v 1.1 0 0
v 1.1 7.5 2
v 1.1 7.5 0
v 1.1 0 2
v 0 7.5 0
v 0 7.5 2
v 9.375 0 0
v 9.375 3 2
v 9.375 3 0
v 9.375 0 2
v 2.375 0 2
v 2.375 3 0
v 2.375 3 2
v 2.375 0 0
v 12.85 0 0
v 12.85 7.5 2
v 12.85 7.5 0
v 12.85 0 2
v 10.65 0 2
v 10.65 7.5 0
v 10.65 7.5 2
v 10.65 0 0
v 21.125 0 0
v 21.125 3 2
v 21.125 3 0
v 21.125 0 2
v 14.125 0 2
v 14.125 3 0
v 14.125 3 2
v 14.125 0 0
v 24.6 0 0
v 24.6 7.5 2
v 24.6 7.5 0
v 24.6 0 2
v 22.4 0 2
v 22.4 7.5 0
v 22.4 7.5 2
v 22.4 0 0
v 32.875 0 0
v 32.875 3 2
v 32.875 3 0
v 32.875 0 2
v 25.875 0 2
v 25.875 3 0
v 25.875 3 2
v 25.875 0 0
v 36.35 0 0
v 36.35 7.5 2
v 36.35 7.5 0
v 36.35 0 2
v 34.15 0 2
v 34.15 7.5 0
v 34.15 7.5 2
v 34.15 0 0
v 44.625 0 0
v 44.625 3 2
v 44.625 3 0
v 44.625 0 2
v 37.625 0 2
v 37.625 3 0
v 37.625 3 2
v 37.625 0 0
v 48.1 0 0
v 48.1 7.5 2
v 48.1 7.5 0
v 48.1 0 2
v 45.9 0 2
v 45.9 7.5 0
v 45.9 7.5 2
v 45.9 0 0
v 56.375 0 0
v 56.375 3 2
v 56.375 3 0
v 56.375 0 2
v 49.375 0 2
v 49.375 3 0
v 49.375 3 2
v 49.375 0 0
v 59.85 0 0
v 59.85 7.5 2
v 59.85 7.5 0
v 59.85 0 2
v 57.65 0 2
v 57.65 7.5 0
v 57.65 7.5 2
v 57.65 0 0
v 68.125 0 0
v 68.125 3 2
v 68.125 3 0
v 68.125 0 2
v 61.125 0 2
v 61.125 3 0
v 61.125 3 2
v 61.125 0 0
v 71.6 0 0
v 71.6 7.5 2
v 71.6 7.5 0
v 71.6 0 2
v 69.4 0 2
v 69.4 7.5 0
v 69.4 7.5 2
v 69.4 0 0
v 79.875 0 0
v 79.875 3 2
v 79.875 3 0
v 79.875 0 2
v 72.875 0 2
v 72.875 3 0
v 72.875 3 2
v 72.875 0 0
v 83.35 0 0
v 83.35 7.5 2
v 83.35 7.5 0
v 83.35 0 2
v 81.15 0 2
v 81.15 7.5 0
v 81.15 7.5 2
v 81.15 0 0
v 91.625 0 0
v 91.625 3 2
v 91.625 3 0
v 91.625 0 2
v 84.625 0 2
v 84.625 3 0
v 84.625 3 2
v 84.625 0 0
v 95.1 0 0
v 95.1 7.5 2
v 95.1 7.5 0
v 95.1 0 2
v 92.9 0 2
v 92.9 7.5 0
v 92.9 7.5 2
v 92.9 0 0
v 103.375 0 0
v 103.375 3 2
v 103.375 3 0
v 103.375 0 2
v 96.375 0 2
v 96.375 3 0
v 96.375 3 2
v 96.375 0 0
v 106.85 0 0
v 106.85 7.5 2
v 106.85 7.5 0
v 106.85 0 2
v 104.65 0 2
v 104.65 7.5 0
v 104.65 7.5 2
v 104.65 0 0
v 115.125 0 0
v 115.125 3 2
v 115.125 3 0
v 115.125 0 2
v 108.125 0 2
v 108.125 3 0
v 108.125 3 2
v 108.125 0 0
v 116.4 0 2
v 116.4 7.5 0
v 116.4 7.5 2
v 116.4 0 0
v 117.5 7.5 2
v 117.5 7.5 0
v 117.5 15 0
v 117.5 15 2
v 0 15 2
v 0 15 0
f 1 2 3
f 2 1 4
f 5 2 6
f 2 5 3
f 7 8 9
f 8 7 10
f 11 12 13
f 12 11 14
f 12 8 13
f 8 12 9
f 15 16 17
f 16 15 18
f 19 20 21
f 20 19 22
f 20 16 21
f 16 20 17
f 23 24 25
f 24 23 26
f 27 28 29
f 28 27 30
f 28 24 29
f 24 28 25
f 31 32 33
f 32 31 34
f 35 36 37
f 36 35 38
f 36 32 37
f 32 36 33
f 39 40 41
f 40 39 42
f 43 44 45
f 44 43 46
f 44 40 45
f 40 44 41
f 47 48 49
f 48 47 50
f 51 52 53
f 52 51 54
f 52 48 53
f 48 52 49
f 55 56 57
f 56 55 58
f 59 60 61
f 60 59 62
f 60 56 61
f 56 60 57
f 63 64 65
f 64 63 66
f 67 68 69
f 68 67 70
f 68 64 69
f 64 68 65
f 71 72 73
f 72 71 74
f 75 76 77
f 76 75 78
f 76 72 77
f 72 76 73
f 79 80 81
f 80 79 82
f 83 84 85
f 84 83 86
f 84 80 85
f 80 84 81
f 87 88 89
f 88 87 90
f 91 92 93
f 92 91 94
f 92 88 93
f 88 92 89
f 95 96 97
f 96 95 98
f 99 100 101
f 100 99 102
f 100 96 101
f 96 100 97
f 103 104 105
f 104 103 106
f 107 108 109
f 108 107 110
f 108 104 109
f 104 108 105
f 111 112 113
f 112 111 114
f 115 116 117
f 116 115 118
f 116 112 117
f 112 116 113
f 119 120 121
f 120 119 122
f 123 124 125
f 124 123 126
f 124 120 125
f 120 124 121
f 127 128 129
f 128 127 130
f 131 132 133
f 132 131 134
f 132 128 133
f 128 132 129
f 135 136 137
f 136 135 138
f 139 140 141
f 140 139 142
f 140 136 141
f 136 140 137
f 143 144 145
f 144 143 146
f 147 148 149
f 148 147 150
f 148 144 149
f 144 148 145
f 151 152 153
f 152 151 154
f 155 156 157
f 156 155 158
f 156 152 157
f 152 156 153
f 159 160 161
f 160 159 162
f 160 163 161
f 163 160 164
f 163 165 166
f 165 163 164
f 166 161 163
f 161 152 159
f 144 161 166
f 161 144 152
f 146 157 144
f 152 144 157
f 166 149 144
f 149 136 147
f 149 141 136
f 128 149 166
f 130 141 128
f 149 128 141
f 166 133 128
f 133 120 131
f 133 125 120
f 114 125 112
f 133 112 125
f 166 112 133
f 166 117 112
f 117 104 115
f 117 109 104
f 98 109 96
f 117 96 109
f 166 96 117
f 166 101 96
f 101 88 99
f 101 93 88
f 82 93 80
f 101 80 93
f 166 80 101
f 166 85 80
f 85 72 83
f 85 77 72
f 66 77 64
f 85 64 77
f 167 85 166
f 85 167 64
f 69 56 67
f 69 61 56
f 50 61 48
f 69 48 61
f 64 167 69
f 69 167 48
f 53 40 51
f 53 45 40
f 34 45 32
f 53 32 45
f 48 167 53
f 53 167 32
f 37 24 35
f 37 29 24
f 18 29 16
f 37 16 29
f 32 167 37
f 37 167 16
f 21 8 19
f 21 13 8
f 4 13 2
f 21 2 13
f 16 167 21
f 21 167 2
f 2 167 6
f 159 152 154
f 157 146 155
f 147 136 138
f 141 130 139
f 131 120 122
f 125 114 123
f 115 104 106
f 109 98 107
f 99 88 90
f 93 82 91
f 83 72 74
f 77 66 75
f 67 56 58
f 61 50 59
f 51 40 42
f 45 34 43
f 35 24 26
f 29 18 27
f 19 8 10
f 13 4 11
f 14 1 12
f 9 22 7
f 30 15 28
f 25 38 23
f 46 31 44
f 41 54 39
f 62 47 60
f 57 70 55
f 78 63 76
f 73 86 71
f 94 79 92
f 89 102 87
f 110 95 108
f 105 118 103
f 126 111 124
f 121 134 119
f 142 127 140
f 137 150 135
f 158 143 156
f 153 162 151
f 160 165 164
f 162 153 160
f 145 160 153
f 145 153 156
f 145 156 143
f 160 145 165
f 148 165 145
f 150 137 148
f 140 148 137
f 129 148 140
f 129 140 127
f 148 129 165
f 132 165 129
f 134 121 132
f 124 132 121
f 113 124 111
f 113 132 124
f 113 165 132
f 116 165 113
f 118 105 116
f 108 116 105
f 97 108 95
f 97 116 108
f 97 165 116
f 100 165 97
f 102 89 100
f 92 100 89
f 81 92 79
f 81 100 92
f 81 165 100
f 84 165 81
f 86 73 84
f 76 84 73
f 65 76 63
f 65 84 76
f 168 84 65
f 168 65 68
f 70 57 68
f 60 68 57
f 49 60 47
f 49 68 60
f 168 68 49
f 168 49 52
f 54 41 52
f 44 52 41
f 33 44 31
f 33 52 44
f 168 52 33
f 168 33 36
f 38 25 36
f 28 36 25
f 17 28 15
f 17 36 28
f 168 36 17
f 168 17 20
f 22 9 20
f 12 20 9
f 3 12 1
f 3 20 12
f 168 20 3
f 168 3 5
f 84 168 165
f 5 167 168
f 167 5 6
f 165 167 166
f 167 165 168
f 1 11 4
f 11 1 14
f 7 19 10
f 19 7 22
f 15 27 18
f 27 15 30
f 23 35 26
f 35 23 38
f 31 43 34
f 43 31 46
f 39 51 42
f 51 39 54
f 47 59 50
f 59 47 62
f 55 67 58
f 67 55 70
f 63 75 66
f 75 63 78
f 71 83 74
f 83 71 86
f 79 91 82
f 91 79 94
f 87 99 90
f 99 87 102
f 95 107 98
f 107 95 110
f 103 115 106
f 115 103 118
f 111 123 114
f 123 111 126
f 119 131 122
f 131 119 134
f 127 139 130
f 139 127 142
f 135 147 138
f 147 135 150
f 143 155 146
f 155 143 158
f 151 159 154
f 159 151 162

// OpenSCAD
CUT = 1000;

KeyWidth = 6;
KeySpacing = 117.5 / 10; //KeyWidth + KeyGapWidth;
KeyGapWidth = KeySpacing - KeyWidth;

KeyTravel = 2;
MinSensorDistance = 1.5;
MinKeyHeight = 1;
MaxKeyHeight = MinKeyHeight + KeyTravel;
SensorHeight = 4.5;
SensorWidth = 4.5;
SensorLength = 7;
SensorOffset = 4.5;
SensorGap = 5;

SlotWidth = 2.2;
SlotHeight = 7.5;
NSlots = 33/3;

PcbHeight = 20;
PcbStopThickness = 2;
HookHeight = MaxKeyHeight + MinSensorDistance + SensorHeight;
HookLength = 21;
HookDrop = 20;
HookArm = 2;
HookThickness = SlotWidth-0.1;
HookRetainerHeight = 1;
HookRetainerThickness = 1;

RailHeight = 15;
RailLength = KeySpacing*(NSlots-1);
echo(RailLength);
RailThickness = 2;
RailArea = RailThickness * 2 + 3 * HookRetainerThickness;

TotalLength = RailArea + HookLength;

echo(TotalLength);
assert(TotalLength < 33);

// from hook print aligned perspective

ShelfWidth = 10;
ShelfLength = 10;
SelfThickness = 10;
ShelfRetainerHeight = 5;

module rail()
{
    difference()
    {
        cube([RailLength, RailHeight, RailThickness]);
        // make iterative
        for (i = [0:1:NSlots]) {
            translate([-SlotWidth/2+i*KeySpacing, -1, -1])
                cube([SlotWidth, SlotHeight+1, CUT]);
            translate([KeyGapWidth/2-0.5+i*KeySpacing, -1, -1])
                cube([KeyWidth+1, MaxKeyHeight+1, CUT]);
        }
    }
}

module hook()
{
    difference()
    {
        union()
        {
            // bottom bar
            cube([HookLength, HookArm, HookThickness]);
            // PCB support
            translate([SensorOffset,0,0])
                cube([SensorLength, HookHeight, HookThickness]);
            // PCB stops
            translate([-PcbStopThickness,0,0])
                cube([PcbStopThickness, HookHeight+1.6, HookThickness]);
            translate([-PcbStopThickness,HookHeight+1.6,0])
                cube([PcbStopThickness+.8, 1.6, HookThickness]);
            translate([PcbHeight,0,0])
                cube([PcbStopThickness, HookHeight+1.6, HookThickness]); 
            translate([PcbHeight-0.8,HookHeight+1.6,0])
                cube([PcbStopThickness+.8, 1.6, HookThickness]);
            // slot joint
            translate([HookLength,0,0])
                cube([RailArea, SlotHeight-0.1, HookThickness]);
            // retainer walls
            translate([HookLength,0,0])
                cube([HookRetainerThickness, SlotHeight, HookThickness+HookRetainerHeight]);
            translate([HookLength+HookRetainerThickness+RailThickness+0.1,0,0])
                cube([HookRetainerThickness-0.2, SlotHeight, HookThickness+HookRetainerHeight]);
            translate([HookLength+HookRetainerThickness*2+RailThickness*2,0,0])
                cube([HookRetainerThickness, SlotHeight, HookThickness+HookRetainerHeight]);
        }
        //translate([-HookArm, HookArm, -1]) cube([HookLength, HookDrop, CUT]);
    }
}

module aligner()
{
    AlignerWidth = SensorWidth*2 + SensorGap + 2;
    difference()
    {
        union() {
            cube([AlignerWidth, PcbHeight + 4, 2]);
            cube([AlignerWidth, 2, SensorHeight + 2]);
            translate([0,PcbHeight+2,0])
            cube([AlignerWidth, 2, SensorHeight + 2]);
            translate([0,2,SensorHeight+1.6])
                cube([AlignerWidth, 0.2, 0.4]);
            translate([0,PcbHeight+2-0.2,SensorHeight+1.6])
                cube([AlignerWidth, 0.2, 0.4]);
            translate([1+SensorWidth,0,0]) cube([SensorGap,PcbHeight,SensorHeight]);
        }
        translate([1+SensorWidth + SensorGap,SensorOffset+2,0])
            cube([SensorWidth, SensorLength, SensorHeight]);
        translate([1,SensorOffset+2,0])
            cube([SensorWidth, SensorLength, SensorHeight]);
    }
}


module frame()
{
    keyboard_x = 402;
    left_cheek_x  = 26;
    right_cheek_x = 23;
    full_x = left_cheek_x + keyboard_x + right_cheek_x; // == 451
    cheek_z = 9;
    key_z = 4;
    frame_y = 24;
    frame_z = 24;
    
    module keyboard_space()
    {
        full_cheek_z = 19;
        full_cheek_y = 165;
        key_y = 84;
        translate([0,-key_y,-cheek_z]) union()
        {
        cube([left_cheek_x,full_cheek_y,full_cheek_z]);
        translate([left_cheek_x,0,0]) cube([keyboard_x,key_y,17]);
        translate([left_cheek_x,0,0]) cube([keyboard_x,107,12]);
        translate([left_cheek_x + keyboard_x,0,0]) 
            cube([right_cheek_x,full_cheek_y,full_cheek_z]);
        }
    }
    
    //keyboard_space();

    module _frame()
    {
    ang = 60;
    //hyp = sqrt(frame_y*frame_y + 100);
    difference()
    {
        // main bar
        cube([full_x,frame_y,frame_z]);
        // cut for left cheek
        cube([left_cheek_x,999,cheek_z]);
        // left screw hole
        translate([left_cheek_x/2,frame_y-7,cheek_z]) cylinder(h=999,d=3);
        translate([left_cheek_x/2,frame_y-7,cheek_z+3]) cylinder(h=999,d=6);
        
        // cut for right cheek
        translate([left_cheek_x + keyboard_x,0,0]) cube([right_cheek_x,999,cheek_z]);
        // cut for cable on right
        translate([full_x-5,0,cheek_z]) cube([5,999,5]);
        // right screw hole
        translate([full_x-right_cheek_x/2,frame_y-7,cheek_z]) cylinder(h=999,d=3);
        translate([full_x-right_cheek_x/2,frame_y-7,cheek_z+3]) cylinder(h=999,d=6);
        
        translate([0,0,key_z]) rotate([ang,0,0]) cube([999,999,999]);
        translate([left_cheek_x,10,0]) cube([keyboard_x,5,RailHeight]);
        translate([left_cheek_x,9,0])  cube([keyboard_x,1,9]);
        translate([left_cheek_x,10,0]) cube([keyboard_x,999,RailHeight-3]);
        translate([left_cheek_x,18,0]) cube([keyboard_x,999,frame_z-1]);
    }
    }
    _frame();
}

rail();
//hook();
//aligner();
//frame();
